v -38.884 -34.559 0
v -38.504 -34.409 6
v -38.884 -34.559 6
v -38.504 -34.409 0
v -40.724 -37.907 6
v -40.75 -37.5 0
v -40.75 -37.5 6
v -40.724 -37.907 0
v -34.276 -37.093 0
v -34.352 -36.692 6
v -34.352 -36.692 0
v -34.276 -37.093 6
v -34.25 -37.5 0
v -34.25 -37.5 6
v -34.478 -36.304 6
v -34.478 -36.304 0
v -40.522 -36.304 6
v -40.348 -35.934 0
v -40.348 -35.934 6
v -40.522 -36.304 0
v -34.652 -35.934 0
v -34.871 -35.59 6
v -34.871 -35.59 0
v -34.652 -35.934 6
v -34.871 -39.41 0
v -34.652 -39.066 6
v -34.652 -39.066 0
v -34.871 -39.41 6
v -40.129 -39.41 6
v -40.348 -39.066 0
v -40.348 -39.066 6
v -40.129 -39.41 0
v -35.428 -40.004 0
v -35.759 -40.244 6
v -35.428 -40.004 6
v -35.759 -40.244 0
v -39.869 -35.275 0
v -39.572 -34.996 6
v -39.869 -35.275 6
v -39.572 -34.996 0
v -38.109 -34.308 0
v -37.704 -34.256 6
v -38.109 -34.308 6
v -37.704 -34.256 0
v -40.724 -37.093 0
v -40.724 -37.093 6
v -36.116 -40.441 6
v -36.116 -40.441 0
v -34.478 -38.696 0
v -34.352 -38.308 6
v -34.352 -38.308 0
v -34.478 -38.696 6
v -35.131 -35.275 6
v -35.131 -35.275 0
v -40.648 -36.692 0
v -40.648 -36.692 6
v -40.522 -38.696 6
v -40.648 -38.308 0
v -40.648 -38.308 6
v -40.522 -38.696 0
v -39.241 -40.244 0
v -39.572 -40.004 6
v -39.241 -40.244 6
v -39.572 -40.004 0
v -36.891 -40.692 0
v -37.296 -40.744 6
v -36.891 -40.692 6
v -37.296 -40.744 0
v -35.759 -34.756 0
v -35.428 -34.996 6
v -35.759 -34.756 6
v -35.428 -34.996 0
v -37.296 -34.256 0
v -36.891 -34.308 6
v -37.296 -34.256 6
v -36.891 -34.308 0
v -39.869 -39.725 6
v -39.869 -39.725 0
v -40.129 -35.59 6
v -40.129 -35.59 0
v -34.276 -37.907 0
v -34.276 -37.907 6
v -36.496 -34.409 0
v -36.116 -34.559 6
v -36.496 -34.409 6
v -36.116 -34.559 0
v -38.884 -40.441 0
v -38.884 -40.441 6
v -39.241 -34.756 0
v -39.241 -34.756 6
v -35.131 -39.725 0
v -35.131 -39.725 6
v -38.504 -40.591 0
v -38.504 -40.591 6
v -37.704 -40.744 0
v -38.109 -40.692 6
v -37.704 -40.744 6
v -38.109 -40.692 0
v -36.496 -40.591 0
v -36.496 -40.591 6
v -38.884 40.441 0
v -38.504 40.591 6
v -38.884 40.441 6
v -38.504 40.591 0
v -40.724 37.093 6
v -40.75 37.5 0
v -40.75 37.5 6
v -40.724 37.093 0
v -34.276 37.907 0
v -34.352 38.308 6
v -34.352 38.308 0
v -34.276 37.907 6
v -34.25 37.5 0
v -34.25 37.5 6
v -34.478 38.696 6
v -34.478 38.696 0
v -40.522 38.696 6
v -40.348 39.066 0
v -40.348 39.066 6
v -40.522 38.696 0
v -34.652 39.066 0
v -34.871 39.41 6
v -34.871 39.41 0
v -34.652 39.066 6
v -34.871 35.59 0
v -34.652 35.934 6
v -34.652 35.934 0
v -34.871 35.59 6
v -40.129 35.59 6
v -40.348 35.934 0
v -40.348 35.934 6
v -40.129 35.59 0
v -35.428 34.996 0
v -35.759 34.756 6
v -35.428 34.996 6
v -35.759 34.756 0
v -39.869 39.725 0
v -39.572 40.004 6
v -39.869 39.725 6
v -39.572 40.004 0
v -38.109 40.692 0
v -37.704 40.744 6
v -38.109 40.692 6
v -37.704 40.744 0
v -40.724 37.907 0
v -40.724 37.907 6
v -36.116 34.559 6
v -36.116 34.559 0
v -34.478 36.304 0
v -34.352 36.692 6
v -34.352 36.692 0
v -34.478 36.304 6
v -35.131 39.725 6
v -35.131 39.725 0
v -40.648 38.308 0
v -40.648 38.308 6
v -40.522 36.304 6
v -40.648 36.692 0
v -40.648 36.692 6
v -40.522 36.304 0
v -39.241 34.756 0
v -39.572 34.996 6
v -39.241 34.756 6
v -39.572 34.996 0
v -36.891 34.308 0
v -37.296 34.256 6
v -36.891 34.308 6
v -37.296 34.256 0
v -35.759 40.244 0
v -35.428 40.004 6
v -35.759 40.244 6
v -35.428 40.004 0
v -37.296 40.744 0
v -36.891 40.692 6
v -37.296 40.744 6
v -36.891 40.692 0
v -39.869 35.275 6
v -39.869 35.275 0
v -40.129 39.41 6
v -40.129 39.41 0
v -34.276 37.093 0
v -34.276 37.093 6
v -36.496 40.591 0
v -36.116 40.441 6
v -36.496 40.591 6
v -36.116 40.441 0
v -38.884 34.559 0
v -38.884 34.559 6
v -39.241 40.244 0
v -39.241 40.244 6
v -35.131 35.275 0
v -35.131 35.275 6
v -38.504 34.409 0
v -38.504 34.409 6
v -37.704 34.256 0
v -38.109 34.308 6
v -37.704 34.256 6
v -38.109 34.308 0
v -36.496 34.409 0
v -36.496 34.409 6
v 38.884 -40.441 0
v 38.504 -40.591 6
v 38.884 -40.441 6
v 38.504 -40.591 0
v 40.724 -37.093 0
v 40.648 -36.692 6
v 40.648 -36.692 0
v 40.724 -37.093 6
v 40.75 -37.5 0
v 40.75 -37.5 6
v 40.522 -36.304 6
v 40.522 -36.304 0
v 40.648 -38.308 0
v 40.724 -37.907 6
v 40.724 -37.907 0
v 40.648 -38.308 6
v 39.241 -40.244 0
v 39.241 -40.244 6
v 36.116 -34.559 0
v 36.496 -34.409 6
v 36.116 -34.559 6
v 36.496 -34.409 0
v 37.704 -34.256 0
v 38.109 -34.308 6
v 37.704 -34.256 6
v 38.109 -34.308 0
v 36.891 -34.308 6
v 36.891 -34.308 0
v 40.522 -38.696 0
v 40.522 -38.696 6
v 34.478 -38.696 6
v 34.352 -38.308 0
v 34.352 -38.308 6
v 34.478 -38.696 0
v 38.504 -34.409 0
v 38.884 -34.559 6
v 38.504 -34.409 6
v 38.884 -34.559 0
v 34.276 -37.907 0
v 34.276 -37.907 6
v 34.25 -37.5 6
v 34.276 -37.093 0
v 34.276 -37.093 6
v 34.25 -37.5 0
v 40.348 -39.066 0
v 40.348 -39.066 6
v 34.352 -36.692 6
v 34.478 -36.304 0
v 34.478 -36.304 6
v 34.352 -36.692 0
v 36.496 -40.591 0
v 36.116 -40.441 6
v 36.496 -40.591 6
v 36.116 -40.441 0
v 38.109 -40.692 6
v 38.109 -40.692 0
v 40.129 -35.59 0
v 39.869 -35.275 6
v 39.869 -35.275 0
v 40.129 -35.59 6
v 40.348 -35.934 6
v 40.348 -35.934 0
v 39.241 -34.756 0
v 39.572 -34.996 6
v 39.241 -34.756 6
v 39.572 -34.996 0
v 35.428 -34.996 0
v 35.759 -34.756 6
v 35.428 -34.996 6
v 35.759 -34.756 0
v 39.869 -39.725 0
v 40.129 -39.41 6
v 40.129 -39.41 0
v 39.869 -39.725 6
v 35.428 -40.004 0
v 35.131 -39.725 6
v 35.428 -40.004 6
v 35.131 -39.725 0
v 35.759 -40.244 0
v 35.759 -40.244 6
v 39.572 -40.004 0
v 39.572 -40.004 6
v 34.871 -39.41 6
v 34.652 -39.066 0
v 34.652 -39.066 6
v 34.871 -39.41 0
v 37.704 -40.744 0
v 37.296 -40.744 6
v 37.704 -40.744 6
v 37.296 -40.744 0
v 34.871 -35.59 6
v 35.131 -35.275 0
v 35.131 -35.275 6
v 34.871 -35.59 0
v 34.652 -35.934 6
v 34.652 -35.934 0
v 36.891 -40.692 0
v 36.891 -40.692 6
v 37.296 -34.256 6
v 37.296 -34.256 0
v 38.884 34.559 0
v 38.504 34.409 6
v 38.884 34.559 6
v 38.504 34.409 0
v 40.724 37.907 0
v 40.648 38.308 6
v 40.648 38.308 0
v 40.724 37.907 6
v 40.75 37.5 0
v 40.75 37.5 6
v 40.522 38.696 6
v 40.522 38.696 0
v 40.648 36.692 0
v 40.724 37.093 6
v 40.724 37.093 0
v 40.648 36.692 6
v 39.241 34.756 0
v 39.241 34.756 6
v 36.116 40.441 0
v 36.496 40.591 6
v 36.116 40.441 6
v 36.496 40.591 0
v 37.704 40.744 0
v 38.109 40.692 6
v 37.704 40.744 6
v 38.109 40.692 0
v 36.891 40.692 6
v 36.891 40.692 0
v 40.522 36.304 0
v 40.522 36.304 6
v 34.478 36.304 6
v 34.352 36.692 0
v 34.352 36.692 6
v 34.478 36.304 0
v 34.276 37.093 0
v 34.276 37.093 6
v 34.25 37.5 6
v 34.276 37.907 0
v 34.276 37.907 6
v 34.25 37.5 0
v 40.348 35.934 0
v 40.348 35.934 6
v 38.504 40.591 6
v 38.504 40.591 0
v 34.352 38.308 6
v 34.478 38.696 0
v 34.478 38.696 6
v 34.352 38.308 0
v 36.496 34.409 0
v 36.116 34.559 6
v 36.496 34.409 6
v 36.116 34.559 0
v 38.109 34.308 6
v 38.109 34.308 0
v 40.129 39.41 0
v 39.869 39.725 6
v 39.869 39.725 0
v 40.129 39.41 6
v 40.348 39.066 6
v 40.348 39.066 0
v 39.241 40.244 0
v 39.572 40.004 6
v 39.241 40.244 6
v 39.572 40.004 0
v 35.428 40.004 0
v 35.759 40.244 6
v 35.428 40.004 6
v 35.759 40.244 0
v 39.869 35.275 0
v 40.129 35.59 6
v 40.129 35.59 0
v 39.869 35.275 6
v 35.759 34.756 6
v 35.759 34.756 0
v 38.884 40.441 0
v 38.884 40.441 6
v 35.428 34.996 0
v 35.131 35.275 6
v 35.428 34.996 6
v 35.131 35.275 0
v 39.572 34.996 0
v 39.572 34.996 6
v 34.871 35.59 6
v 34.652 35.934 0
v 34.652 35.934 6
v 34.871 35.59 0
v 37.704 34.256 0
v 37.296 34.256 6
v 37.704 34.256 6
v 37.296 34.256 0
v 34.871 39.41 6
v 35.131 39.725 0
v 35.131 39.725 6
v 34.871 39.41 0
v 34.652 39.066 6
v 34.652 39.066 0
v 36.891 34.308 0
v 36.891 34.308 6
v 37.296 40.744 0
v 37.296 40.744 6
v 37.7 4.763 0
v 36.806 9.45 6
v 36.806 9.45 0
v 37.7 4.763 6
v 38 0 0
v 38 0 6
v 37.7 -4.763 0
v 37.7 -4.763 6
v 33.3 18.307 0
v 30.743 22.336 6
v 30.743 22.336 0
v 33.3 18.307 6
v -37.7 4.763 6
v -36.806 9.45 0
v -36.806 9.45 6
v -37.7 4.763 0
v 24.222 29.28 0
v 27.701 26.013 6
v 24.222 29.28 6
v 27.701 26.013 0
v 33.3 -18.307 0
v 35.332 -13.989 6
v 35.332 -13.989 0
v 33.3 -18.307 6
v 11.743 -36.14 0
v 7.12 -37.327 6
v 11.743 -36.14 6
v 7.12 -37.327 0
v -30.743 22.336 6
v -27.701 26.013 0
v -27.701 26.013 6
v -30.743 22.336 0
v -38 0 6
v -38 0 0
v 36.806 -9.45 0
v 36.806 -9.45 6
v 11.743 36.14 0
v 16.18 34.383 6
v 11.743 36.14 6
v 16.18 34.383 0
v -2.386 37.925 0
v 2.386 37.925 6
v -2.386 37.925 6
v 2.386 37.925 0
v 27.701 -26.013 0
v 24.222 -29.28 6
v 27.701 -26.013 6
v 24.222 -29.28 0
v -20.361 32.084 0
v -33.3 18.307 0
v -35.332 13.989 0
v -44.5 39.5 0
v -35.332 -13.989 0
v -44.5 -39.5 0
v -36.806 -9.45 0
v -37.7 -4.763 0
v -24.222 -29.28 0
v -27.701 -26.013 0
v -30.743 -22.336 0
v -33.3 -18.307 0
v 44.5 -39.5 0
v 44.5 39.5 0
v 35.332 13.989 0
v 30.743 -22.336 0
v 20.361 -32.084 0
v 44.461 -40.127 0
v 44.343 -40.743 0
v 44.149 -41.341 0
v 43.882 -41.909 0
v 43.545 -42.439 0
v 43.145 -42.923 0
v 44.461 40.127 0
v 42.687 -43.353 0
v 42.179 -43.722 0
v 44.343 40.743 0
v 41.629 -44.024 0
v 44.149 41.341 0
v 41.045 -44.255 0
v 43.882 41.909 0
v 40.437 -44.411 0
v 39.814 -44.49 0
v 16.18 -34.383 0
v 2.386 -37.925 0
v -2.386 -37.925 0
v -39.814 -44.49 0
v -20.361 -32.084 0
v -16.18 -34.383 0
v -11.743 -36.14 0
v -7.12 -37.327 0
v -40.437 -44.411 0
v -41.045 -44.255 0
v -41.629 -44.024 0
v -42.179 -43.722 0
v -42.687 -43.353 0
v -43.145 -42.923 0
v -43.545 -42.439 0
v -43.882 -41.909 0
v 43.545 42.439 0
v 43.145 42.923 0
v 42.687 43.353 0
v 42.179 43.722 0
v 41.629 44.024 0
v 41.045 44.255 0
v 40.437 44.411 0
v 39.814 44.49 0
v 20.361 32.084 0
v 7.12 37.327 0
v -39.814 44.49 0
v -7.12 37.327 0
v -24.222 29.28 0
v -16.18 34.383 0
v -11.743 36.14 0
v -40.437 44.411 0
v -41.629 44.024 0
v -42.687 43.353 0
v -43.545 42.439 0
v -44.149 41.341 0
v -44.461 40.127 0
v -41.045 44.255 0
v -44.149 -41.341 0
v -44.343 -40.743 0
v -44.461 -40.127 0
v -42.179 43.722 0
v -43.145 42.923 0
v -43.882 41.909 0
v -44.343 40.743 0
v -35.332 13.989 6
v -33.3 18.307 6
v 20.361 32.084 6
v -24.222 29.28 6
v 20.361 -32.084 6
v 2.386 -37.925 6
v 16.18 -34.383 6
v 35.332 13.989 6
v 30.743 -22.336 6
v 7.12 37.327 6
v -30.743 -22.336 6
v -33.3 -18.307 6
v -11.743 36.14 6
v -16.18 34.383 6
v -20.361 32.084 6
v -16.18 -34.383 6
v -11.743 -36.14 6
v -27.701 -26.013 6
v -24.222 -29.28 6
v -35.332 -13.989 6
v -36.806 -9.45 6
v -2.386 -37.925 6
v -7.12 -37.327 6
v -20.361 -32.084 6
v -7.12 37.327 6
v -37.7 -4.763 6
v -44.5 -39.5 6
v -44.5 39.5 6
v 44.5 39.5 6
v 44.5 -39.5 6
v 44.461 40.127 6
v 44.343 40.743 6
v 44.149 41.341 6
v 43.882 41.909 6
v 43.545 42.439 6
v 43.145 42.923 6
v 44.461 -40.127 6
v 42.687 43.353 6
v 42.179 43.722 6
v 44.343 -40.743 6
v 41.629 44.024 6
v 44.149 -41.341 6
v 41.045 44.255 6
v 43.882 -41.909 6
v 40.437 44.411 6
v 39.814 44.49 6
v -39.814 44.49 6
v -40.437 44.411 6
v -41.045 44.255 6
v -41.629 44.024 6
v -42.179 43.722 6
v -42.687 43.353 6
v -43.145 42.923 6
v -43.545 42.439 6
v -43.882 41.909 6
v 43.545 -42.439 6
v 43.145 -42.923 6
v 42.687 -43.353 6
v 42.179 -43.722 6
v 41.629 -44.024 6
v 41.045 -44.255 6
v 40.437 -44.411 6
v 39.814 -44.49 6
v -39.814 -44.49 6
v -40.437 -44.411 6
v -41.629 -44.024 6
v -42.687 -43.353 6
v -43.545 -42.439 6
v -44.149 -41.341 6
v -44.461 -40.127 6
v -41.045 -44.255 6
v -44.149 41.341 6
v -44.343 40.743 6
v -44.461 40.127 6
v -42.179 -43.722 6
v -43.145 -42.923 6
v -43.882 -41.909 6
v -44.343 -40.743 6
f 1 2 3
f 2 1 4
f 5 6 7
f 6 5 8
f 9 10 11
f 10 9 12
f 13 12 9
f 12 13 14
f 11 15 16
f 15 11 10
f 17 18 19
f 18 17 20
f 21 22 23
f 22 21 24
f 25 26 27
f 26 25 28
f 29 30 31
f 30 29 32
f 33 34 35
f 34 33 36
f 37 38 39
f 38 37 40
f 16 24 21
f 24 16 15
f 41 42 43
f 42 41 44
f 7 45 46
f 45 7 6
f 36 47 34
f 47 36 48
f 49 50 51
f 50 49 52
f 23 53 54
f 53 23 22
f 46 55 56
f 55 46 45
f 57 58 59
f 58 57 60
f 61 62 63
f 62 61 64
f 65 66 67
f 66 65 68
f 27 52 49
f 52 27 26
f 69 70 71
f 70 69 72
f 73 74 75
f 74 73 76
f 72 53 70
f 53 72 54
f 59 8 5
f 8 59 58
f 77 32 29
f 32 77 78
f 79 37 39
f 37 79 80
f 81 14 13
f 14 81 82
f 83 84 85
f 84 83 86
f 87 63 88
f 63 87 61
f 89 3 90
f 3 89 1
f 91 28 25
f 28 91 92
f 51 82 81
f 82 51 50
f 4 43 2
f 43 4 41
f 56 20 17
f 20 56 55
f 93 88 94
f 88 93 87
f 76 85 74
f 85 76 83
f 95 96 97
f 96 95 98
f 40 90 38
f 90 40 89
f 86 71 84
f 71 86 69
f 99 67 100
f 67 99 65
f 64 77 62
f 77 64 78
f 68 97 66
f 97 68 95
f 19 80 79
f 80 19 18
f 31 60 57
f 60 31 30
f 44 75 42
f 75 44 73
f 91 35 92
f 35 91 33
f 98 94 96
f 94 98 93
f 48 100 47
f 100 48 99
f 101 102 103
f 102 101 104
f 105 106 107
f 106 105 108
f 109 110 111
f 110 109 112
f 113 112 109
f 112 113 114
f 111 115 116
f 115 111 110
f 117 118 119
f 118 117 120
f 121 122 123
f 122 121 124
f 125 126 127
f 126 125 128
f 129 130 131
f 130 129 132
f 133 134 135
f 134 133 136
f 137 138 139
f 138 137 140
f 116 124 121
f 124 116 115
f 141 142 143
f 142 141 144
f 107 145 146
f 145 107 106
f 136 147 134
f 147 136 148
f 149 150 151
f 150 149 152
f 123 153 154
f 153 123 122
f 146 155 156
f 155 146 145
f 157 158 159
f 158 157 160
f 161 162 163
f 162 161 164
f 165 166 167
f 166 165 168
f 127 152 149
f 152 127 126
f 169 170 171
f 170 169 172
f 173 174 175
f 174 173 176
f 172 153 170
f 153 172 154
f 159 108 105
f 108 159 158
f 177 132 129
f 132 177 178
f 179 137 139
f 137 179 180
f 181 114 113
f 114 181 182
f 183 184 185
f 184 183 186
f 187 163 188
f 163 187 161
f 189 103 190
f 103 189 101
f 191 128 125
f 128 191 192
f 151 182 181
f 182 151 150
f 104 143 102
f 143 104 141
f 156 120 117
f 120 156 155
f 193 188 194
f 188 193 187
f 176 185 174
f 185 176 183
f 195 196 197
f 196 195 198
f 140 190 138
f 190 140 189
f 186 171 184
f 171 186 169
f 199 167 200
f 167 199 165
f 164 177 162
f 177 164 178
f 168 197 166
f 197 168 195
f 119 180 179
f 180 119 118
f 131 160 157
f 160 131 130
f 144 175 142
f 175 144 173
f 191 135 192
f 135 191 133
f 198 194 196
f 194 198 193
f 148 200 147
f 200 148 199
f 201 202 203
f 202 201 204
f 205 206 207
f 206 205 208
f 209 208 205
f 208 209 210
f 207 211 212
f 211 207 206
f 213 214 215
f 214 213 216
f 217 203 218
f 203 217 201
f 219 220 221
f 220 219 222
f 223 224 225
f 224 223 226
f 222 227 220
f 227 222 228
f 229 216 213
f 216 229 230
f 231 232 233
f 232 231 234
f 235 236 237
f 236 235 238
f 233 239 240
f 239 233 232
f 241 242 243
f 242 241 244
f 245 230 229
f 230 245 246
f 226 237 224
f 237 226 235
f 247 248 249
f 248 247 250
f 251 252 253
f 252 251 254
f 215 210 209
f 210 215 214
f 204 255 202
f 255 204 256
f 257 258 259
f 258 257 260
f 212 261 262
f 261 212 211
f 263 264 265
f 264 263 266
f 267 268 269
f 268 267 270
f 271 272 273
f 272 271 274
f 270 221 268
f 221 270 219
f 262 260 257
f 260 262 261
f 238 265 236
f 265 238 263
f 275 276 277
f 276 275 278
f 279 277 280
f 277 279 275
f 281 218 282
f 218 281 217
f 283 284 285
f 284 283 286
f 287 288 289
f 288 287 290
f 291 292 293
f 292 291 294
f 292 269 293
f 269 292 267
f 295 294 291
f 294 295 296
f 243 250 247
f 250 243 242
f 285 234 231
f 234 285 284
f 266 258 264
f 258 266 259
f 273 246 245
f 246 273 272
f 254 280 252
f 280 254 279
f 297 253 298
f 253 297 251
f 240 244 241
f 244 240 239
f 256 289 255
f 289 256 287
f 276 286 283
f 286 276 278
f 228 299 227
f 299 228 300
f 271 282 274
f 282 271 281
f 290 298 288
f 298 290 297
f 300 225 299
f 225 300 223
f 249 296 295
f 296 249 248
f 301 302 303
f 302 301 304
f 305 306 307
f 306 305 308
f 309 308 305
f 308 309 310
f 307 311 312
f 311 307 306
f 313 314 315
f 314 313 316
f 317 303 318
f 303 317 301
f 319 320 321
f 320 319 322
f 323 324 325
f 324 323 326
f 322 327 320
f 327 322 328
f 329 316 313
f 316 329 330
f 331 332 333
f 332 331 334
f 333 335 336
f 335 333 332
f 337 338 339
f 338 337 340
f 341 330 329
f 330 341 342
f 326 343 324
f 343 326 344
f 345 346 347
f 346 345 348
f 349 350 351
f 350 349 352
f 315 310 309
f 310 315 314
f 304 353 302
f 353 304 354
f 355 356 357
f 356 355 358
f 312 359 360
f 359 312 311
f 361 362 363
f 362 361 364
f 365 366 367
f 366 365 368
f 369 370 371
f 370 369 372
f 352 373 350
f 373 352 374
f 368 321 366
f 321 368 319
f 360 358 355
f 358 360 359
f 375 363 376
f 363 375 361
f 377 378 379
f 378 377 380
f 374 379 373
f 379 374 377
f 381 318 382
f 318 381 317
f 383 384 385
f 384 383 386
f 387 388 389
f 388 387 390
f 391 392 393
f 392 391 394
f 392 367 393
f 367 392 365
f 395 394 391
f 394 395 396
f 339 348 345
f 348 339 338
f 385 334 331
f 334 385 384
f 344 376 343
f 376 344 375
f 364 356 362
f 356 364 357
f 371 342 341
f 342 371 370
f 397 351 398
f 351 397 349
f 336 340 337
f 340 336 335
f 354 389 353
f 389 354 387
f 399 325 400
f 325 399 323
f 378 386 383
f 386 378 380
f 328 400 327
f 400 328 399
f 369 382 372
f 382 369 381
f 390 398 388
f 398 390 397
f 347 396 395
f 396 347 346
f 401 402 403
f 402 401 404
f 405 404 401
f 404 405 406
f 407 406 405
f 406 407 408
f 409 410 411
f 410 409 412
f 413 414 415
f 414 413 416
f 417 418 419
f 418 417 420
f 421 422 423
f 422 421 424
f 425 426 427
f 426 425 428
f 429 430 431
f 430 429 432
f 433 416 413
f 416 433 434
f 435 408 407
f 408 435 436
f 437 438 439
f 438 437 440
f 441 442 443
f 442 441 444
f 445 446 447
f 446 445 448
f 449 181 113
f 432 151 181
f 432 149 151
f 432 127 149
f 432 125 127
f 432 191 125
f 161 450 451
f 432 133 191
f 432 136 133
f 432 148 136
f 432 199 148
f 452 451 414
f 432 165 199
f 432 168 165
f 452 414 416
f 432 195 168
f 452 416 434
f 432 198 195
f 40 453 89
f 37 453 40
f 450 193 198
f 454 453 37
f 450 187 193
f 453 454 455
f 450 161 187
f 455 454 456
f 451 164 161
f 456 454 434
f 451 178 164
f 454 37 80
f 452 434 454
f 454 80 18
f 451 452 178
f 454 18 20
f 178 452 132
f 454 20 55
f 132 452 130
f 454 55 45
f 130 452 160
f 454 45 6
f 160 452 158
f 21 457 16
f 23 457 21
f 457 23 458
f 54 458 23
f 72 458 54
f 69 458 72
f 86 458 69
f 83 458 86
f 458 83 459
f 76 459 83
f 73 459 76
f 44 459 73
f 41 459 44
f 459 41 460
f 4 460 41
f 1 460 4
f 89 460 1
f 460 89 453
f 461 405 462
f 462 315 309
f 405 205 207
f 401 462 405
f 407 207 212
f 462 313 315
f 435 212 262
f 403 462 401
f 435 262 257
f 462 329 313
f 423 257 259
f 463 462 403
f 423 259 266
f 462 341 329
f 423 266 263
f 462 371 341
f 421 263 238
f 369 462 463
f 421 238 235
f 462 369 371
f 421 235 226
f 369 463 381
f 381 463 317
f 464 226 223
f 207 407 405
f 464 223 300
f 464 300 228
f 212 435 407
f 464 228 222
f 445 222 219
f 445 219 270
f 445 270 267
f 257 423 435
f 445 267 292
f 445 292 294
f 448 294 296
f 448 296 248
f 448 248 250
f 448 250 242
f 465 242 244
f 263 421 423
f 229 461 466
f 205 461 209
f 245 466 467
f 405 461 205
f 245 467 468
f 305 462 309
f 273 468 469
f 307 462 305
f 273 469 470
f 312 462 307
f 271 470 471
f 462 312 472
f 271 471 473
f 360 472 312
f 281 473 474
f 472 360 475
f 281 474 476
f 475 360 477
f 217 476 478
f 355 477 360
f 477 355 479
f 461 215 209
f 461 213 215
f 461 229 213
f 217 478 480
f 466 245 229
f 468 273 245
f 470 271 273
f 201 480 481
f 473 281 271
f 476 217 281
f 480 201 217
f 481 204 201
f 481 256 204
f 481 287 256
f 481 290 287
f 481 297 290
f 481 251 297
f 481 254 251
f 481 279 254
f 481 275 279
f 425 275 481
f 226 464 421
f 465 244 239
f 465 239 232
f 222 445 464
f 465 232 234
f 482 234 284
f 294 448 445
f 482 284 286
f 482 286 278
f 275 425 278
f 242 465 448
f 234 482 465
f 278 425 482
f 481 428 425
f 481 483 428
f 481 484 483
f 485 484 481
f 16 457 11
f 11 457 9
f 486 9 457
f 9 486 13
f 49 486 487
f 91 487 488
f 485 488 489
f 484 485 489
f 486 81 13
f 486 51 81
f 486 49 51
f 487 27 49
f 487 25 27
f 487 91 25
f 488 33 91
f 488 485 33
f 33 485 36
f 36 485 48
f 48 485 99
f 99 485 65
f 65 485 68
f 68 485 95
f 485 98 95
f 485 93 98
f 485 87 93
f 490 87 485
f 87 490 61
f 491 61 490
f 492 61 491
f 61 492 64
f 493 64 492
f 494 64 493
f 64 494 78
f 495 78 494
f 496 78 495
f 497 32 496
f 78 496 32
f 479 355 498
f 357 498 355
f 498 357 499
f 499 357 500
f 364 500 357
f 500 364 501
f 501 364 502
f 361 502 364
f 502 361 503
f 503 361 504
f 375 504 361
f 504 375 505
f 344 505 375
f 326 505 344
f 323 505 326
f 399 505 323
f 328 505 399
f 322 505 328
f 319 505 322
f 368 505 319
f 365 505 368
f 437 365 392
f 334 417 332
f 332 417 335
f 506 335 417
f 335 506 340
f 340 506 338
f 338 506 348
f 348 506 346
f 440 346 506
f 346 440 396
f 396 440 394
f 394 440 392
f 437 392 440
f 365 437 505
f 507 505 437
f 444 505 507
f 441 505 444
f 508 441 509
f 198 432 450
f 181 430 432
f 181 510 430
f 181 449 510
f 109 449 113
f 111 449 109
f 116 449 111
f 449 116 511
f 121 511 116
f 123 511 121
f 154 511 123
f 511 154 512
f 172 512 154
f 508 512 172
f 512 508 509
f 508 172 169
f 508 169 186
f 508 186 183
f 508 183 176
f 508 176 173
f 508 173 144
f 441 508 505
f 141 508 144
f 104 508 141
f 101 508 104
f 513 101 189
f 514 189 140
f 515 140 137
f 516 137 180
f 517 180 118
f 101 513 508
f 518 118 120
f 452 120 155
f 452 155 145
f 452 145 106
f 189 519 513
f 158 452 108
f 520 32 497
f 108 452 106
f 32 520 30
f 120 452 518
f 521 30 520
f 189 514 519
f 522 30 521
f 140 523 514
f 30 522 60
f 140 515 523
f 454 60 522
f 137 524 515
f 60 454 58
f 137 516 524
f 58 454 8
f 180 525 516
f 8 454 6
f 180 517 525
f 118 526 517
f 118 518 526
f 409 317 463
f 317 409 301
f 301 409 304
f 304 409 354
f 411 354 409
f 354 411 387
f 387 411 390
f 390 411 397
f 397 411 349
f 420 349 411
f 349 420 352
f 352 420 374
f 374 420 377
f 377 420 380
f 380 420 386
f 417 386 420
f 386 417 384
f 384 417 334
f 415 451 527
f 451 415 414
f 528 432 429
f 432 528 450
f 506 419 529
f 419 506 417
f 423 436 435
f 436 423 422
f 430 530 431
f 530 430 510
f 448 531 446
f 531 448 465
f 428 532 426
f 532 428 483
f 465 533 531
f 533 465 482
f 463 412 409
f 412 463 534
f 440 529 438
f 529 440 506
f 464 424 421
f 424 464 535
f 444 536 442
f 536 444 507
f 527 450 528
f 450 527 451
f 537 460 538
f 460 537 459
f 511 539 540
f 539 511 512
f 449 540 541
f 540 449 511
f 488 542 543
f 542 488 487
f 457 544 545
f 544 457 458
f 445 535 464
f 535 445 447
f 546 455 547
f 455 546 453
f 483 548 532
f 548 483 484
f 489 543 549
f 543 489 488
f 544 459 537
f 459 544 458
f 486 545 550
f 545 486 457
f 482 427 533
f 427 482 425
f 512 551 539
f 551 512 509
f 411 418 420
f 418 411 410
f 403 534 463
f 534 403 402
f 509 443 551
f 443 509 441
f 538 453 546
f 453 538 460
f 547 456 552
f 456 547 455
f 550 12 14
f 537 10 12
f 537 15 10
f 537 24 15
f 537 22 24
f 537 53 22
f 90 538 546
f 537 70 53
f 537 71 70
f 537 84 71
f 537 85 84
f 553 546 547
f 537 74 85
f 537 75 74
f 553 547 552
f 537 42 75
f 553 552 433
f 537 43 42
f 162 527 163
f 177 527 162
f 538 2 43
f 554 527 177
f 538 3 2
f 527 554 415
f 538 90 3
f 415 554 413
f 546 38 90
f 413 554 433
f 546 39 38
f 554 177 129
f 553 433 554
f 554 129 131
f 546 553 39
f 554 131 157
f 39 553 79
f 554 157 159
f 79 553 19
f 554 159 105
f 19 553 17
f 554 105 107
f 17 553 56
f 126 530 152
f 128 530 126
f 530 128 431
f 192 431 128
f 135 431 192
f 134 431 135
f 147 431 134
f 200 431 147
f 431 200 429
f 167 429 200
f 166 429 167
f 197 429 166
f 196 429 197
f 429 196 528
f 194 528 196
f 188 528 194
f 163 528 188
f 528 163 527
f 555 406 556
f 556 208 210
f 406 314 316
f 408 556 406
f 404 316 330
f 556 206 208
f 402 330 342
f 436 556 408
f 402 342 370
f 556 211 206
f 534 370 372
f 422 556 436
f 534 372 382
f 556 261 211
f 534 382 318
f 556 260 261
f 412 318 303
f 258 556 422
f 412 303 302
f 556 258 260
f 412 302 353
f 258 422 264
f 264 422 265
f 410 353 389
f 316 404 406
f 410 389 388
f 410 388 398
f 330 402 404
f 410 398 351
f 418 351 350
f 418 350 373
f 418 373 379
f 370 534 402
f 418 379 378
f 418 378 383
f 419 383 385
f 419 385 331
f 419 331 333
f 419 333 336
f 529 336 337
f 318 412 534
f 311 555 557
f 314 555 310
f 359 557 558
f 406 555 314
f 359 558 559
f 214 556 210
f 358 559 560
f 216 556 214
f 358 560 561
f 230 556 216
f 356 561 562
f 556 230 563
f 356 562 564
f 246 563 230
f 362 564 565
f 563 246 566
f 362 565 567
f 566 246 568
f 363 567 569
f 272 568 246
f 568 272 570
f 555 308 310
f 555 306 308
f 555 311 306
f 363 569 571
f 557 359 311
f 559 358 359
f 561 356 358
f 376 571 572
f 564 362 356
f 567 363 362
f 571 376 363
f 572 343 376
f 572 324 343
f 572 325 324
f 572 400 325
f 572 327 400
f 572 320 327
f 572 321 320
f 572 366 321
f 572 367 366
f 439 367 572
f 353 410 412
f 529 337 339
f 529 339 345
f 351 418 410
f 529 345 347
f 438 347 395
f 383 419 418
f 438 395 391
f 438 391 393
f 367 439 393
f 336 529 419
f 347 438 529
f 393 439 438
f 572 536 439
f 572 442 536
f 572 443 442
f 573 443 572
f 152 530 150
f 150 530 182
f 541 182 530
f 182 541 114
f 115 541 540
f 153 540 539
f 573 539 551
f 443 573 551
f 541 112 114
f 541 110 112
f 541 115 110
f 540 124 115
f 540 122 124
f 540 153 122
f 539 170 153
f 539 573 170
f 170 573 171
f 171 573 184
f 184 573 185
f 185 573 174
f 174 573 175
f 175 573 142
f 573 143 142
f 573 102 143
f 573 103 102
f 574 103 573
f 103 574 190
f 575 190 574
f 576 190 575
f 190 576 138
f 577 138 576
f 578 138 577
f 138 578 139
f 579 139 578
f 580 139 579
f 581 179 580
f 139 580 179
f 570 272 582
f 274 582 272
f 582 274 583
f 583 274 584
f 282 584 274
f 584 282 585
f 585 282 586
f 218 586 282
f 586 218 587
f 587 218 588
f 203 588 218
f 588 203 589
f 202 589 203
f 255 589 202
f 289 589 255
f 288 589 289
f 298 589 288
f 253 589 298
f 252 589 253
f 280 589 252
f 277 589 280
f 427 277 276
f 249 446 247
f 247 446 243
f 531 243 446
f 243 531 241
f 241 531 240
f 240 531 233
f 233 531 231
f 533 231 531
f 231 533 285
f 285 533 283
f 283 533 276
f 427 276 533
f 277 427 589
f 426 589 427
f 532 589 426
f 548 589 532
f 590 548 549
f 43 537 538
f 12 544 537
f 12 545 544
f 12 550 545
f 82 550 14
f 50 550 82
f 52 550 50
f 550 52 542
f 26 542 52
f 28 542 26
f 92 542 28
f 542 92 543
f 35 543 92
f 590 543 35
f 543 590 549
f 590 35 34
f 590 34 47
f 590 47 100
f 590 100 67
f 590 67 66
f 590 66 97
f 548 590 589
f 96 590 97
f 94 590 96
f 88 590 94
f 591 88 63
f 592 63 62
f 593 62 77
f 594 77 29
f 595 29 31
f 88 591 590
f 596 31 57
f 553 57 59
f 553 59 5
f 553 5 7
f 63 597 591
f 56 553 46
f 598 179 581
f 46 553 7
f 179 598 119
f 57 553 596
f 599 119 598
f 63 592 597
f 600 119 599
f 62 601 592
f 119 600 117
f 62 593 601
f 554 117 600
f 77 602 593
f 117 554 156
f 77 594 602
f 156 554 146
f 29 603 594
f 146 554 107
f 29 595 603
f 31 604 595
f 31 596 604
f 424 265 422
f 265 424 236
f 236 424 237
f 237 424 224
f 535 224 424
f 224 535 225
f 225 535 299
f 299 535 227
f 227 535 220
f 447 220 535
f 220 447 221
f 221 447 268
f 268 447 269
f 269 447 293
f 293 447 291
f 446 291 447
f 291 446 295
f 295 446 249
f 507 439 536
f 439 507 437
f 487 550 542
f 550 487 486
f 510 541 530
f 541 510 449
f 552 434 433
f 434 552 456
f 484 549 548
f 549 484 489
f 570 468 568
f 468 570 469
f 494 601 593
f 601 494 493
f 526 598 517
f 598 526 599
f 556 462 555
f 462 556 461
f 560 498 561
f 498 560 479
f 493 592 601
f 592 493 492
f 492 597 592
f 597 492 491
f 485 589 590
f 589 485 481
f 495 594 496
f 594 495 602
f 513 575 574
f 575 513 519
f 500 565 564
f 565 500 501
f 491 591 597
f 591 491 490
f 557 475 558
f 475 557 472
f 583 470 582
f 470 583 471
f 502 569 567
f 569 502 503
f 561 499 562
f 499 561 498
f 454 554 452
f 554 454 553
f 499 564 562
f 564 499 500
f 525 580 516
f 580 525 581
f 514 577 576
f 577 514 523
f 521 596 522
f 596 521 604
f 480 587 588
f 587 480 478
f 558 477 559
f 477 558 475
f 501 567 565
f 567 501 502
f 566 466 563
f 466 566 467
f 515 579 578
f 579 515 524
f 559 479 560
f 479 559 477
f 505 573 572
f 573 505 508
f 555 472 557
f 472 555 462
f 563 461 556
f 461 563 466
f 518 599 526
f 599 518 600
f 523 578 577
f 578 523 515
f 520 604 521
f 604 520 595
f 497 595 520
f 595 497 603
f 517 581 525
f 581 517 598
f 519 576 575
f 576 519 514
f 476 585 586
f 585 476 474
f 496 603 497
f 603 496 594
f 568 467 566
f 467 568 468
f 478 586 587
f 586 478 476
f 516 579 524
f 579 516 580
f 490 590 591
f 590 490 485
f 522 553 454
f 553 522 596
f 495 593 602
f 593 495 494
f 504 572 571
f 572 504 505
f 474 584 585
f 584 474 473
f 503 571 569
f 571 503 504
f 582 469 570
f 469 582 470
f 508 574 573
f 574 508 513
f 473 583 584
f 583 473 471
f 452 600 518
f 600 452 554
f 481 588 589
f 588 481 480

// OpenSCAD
$fn = 50;


difference() {
	union() {
		hull() {
			translate(v = [-39.5000000000, 39.5000000000, 0]) {
				cylinder(h = 6, r = 5);
			}
			translate(v = [39.5000000000, 39.5000000000, 0]) {
				cylinder(h = 6, r = 5);
			}
			translate(v = [-39.5000000000, -39.5000000000, 0]) {
				cylinder(h = 6, r = 5);
			}
			translate(v = [39.5000000000, -39.5000000000, 0]) {
				cylinder(h = 6, r = 5);
			}
		}
	}
	union() {
		#translate(v = [-37.5000000000, -37.5000000000, -100.0000000000]) {
			cylinder(h = 200, r = 3.2500000000);
		}
		#translate(v = [-37.5000000000, 37.5000000000, -100.0000000000]) {
			cylinder(h = 200, r = 3.2500000000);
		}
		#translate(v = [37.5000000000, -37.5000000000, -100.0000000000]) {
			cylinder(h = 200, r = 3.2500000000);
		}
		#translate(v = [37.5000000000, 37.5000000000, -100.0000000000]) {
			cylinder(h = 200, r = 3.2500000000);
		}
		#cylinder(h = 6, r = 38.0000000000);
	}
}
